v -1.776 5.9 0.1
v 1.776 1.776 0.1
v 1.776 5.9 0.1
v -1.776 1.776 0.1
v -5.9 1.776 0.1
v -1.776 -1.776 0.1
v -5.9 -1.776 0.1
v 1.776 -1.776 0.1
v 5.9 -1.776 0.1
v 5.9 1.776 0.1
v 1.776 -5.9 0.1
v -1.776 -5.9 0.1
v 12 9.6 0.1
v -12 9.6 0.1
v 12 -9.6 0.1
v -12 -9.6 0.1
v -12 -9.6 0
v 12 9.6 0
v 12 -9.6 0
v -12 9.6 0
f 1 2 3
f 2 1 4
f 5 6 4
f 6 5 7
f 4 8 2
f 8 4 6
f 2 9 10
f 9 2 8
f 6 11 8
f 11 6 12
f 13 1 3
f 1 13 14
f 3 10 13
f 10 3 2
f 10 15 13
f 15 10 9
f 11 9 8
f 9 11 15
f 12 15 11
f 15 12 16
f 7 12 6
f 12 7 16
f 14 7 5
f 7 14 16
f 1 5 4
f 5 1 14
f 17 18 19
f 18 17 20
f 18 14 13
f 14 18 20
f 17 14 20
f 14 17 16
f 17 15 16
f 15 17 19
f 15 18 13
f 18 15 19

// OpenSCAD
// file: ../p/box5-12.scad
use <../lib.scad>
function ldraw_lib__box5_12() = [
// 0 Box with 5 Faces without Any Edges
// 0 Name: box5-12.dat
// 0 Author: Chris Dee [cwdee]
// 0 !LDRAW_ORG Primitive UPDATE 2009-02
// 0 !LICENSE Licensed under CC BY 2.0 and CC BY 4.0 : see CAreadme.txt
// 
// 0 BFC CERTIFY CCW
  [0,"BFC","CERTIFY"],
  [0,"BFC","CCW"],
// 
// 0 !HISTORY 2009-09-03 [PTadmin] Official Update 2009-02
// 
// 
// 4 16 1 1 1 1 1 -1 -1 1 -1 -1 1 1
  [4,16,1,1,1,1,1,-1,-1,1,-1,-1,1,1],
// 4 16 -1 0 1 1 0 1 1 1 1 -1 1 1
  [4,16,-1,0,1,1,0,1,1,1,1,-1,1,1],
// 4 16 -1 0 -1 -1 0 1 -1 1 1 -1 1 -1
  [4,16,-1,0,-1,-1,0,1,-1,1,1,-1,1,-1],
// 4 16 1 0 -1 -1 0 -1 -1 1 -1 1 1 -1
  [4,16,1,0,-1,-1,0,-1,-1,1,-1,1,1,-1],
// 4 16 1 0 1 1 0 -1 1 1 -1 1 1 1
  [4,16,1,0,1,1,0,-1,1,1,-1,1,1,1],
// 0
];
makepoly(ldraw_lib__box5_12(), line=0.2);
// main file
use <../lib.scad>
use <../p/box5-12.scad>
function ldraw_lib__004158e() = [
// 0 Sticker  2.4 x  3 with Switzerland Flag
// 0 Name: 004158e.dat
// 0 Author: Willy Tschager [Holly-Wood]
// 0 !LDRAW_ORG Part UPDATE 2016-01
// 0 !LICENSE Licensed under CC BY 2.0 and CC BY 4.0 : see CAreadme.txt
// 
// 0 BFC CERTIFY CW
  [0,"BFC","CERTIFY"],
  [0,"BFC","CW"],
// 
// 0 !HISTORY 2009-09-03 [PTadmin] Official Update 2009-02
// 0 !HISTORY 2016-07-01 [cwdee] Updated description
// 0 !HISTORY 2016-12-31 [PTadmin] Official Update 2016-01
// 
// 
// 0 // White
// 4 15 4.44 -0.25 14.75 4.44 -0.25 4.44 -4.44 -0.25 4.44 -4.44 -0.25 14.75
  [4,15,4.44,-0.25,14.75,4.44,-0.25,4.44,-4.44,-0.25,4.44,-4.44,-0.25,14.75],
// 4 15 -4.44 -0.25 -4.44 -14.75 -0.25 -4.44 -14.75 -0.25 4.44 -4.44 -0.25 4.44
  [4,15,-4.44,-0.25,-4.44,-14.75,-0.25,-4.44,-14.75,-0.25,4.44,-4.44,-0.25,4.44],
// 4 15 4.44 -0.25 -4.44 -4.44 -0.25 -4.44 -4.44 -0.25 4.44 4.44 -0.25 4.44
  [4,15,4.44,-0.25,-4.44,-4.44,-0.25,-4.44,-4.44,-0.25,4.44,4.44,-0.25,4.44],
// 4 15 14.75 -0.25 -4.44 4.44 -0.25 -4.44 4.44 -0.25 4.44 14.75 -0.25 4.44
  [4,15,14.75,-0.25,-4.44,4.44,-0.25,-4.44,4.44,-0.25,4.44,14.75,-0.25,4.44],
// 4 15 4.44 -0.25 -14.75 -4.44 -0.25 -14.75 -4.44 -0.25 -4.44 4.44 -0.25 -4.44
  [4,15,4.44,-0.25,-14.75,-4.44,-0.25,-14.75,-4.44,-0.25,-4.44,4.44,-0.25,-4.44],
// 0 // Red
// 4 4 -30 -0.25 24 30 -0.25 24 4.44 -0.25 14.75 -4.44 -0.25 14.75
  [4,4,-30,-0.25,24,30,-0.25,24,4.44,-0.25,14.75,-4.44,-0.25,14.75],
// 4 4 4.44 -0.25 14.75 30 -0.25 24 14.75 -0.25 4.44 4.44 -0.25 4.44
  [4,4,4.44,-0.25,14.75,30,-0.25,24,14.75,-0.25,4.44,4.44,-0.25,4.44],
// 4 4 30 -0.25 -24 14.75 -0.25 -4.44 14.75 -0.25 4.44 30 -0.25 24
  [4,4,30,-0.25,-24,14.75,-0.25,-4.44,14.75,-0.25,4.44,30,-0.25,24],
// 0 // www.holly-wood.it
// 4 4 14.75 -0.25 -4.44 30 -0.25 -24 4.44 -0.25 -14.75 4.44 -0.25 -4.44
  [4,4,14.75,-0.25,-4.44,30,-0.25,-24,4.44,-0.25,-14.75,4.44,-0.25,-4.44],
// 4 4 30 -0.25 -24 -30 -0.25 -24 -4.44 -0.25 -14.75 4.44 -0.25 -14.75
  [4,4,30,-0.25,-24,-30,-0.25,-24,-4.44,-0.25,-14.75,4.44,-0.25,-14.75],
// 4 4 -4.44 -0.25 -14.75 -30 -0.25 -24 -14.75 -0.25 -4.44 -4.44 -0.25 -4.44
  [4,4,-4.44,-0.25,-14.75,-30,-0.25,-24,-14.75,-0.25,-4.44,-4.44,-0.25,-4.44],
// 4 4 -30 -0.25 -24 -30 -0.25 24 -14.75 -0.25 4.44 -14.75 -0.25 -4.44
  [4,4,-30,-0.25,-24,-30,-0.25,24,-14.75,-0.25,4.44,-14.75,-0.25,-4.44],
// 4 4 -14.75 -0.25 4.44 -30 -0.25 24 -4.44 -0.25 14.75 -4.44 -0.25 4.44
  [4,4,-14.75,-0.25,4.44,-30,-0.25,24,-4.44,-0.25,14.75,-4.44,-0.25,4.44],
// 
// 1 15 0 -0.25 0 30 0 0 0 0.25 0 0 0 24 box5-12.dat
  [1,15,0,-0.25,0,30,0,0,0,0.25,0,0,0,24, ldraw_lib__box5_12()],
// 0
];
makepoly(ldraw_lib__004158e(), line=0.2);
